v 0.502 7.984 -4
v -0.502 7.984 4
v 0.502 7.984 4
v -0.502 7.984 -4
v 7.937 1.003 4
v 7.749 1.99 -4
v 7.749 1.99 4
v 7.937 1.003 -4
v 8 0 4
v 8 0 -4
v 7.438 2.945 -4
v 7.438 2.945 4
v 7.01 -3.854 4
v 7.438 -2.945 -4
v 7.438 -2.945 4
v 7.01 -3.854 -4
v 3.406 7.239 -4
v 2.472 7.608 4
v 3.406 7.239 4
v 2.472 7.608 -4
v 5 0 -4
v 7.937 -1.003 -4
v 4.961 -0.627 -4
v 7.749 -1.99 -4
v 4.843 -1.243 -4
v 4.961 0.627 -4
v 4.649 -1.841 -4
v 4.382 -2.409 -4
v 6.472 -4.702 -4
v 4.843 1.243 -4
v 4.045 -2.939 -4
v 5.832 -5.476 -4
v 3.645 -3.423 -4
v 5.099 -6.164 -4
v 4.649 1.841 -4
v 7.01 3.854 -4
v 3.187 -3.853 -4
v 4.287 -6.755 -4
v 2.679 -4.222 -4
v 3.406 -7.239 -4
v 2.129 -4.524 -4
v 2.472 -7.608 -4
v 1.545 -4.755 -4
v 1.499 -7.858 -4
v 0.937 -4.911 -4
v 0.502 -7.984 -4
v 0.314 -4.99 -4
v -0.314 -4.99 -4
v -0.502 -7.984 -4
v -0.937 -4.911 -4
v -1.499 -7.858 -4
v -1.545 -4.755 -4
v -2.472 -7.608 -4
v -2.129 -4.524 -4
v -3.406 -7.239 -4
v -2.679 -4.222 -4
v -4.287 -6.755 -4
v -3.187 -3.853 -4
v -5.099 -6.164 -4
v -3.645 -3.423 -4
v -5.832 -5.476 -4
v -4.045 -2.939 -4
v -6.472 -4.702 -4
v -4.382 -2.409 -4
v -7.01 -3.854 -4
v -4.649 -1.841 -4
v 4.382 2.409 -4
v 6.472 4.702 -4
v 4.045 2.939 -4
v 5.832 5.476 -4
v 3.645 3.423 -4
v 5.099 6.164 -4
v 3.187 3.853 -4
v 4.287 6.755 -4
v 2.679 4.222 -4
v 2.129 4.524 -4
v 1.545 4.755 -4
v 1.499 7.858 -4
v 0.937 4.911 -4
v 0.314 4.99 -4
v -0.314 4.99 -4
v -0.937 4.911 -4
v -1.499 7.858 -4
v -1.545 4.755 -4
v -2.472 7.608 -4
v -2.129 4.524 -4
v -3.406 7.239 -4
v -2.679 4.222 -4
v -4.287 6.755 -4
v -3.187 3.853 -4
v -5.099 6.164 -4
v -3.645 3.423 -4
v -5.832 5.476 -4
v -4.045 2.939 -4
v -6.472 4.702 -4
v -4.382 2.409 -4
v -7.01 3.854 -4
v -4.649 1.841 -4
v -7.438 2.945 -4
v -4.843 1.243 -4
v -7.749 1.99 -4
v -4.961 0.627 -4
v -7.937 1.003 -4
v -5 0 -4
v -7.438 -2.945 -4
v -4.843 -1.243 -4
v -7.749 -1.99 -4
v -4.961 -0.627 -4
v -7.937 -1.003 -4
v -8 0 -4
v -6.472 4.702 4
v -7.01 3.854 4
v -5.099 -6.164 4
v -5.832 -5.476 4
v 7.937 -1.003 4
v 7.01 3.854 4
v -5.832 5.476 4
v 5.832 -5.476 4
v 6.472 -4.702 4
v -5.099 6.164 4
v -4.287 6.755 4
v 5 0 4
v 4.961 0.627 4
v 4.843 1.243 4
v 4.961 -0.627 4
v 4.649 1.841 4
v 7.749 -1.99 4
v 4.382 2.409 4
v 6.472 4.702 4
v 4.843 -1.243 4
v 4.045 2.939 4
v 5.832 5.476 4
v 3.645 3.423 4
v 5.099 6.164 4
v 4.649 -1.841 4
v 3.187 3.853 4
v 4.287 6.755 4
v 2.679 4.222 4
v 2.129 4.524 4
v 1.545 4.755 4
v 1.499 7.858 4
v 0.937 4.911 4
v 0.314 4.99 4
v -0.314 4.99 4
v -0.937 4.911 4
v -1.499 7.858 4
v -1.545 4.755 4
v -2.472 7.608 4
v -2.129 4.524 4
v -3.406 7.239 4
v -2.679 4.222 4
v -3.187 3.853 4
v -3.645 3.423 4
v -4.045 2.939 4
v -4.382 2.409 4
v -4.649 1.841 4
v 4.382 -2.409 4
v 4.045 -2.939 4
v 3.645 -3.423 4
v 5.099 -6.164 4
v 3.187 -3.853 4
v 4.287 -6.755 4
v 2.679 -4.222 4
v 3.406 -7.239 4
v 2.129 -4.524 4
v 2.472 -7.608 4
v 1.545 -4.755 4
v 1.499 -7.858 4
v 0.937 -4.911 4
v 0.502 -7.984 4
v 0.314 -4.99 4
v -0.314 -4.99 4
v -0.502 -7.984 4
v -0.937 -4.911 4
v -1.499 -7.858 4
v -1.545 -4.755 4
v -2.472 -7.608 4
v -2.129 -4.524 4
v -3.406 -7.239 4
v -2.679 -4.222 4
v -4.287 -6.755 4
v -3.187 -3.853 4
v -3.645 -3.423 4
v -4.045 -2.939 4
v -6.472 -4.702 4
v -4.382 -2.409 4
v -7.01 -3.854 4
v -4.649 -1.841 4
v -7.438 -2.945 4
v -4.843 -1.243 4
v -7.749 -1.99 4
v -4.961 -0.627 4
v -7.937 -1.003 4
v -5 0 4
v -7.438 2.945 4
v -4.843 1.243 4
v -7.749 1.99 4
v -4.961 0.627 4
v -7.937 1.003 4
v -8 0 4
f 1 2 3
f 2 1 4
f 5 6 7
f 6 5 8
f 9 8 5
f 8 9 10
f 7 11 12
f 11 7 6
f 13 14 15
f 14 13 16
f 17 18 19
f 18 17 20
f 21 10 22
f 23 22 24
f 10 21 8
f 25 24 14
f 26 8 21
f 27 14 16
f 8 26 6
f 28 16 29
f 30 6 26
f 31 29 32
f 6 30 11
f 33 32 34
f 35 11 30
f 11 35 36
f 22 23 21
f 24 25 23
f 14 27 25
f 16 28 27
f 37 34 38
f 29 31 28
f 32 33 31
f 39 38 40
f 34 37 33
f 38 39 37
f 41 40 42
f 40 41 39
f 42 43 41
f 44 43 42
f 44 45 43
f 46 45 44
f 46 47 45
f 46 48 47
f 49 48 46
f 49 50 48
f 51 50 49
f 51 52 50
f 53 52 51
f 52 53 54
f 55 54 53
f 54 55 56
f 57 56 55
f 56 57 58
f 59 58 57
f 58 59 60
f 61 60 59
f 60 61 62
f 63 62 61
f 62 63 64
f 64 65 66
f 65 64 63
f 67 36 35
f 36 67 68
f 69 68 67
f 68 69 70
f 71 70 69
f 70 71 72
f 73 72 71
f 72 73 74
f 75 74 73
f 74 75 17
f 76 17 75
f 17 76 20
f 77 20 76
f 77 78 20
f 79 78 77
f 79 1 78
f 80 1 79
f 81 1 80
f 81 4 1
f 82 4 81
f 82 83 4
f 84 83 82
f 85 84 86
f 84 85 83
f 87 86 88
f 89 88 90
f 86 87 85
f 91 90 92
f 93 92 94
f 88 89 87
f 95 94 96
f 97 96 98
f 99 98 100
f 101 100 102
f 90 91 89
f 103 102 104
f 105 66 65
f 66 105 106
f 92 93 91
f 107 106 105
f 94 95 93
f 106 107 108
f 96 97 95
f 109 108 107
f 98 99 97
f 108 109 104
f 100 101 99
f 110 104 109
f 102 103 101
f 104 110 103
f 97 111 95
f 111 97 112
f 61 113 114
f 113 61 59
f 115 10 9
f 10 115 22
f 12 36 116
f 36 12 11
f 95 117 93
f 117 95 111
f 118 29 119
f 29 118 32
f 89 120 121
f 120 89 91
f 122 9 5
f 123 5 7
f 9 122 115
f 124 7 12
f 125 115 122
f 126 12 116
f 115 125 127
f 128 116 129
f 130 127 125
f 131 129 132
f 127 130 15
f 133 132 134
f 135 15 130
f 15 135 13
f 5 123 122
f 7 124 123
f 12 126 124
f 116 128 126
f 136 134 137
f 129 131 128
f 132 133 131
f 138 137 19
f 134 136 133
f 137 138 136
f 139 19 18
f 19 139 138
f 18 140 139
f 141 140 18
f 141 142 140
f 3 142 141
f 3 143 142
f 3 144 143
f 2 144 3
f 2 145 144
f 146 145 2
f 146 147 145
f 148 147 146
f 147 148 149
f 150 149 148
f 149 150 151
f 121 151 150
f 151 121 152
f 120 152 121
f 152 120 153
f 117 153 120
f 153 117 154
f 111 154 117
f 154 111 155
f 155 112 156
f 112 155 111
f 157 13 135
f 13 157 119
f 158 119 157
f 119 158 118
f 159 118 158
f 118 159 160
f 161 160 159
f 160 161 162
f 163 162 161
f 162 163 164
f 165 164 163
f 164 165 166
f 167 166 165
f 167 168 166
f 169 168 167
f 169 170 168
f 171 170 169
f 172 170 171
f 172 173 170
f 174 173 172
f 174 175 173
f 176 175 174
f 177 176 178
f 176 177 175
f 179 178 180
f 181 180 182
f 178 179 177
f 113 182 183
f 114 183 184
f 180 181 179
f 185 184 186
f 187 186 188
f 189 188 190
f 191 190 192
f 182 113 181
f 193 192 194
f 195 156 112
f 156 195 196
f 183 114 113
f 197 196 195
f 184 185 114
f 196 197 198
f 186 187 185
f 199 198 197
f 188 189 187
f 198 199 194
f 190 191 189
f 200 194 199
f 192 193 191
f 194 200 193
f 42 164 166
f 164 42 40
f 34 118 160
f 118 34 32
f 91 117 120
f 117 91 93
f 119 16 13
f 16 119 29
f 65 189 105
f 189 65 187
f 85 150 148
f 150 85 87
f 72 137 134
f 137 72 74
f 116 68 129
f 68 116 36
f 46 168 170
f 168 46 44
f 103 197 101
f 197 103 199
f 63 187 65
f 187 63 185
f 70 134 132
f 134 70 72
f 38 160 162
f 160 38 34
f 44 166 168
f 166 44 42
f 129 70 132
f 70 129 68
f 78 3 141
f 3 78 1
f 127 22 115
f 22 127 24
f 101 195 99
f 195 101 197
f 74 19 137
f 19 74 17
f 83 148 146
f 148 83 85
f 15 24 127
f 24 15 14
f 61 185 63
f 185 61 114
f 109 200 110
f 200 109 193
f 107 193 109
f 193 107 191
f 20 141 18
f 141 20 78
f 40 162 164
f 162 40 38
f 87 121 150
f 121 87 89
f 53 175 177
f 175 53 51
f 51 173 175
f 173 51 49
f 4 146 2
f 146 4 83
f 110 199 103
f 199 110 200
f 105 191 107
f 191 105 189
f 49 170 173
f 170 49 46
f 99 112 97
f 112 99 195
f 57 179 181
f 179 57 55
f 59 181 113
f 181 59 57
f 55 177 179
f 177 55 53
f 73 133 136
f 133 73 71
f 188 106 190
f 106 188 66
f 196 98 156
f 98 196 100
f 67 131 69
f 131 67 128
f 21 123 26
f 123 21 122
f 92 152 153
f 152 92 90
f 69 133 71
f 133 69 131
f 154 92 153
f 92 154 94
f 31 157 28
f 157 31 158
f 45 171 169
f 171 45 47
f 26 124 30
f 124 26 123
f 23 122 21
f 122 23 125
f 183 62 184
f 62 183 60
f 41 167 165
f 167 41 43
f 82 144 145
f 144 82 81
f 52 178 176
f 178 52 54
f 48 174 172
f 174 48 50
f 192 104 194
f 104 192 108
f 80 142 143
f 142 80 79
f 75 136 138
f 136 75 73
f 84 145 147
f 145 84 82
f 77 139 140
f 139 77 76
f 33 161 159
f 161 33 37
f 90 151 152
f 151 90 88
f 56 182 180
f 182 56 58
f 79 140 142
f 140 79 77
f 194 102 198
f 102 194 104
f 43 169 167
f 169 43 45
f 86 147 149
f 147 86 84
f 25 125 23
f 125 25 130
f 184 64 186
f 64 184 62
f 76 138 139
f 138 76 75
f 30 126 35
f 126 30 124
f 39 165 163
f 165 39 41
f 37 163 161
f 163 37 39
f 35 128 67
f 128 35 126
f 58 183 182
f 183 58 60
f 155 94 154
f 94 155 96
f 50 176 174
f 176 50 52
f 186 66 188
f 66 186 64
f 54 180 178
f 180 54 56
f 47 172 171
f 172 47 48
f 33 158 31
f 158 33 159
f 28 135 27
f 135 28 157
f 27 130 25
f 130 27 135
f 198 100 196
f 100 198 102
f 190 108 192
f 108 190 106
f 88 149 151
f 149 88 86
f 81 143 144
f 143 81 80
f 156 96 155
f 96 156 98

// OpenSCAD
$fn = 50;


difference() {
	union() {
		translate(v = [0, 0, -4.0000000000]) {
			cylinder(h = 8, r = 8.0000000000);
		}
	}
	union() {
		translate(v = [0, 0, -100.0000000000]) {
			cylinder(h = 200, r = 5.0000000000);
		}
	}
}
